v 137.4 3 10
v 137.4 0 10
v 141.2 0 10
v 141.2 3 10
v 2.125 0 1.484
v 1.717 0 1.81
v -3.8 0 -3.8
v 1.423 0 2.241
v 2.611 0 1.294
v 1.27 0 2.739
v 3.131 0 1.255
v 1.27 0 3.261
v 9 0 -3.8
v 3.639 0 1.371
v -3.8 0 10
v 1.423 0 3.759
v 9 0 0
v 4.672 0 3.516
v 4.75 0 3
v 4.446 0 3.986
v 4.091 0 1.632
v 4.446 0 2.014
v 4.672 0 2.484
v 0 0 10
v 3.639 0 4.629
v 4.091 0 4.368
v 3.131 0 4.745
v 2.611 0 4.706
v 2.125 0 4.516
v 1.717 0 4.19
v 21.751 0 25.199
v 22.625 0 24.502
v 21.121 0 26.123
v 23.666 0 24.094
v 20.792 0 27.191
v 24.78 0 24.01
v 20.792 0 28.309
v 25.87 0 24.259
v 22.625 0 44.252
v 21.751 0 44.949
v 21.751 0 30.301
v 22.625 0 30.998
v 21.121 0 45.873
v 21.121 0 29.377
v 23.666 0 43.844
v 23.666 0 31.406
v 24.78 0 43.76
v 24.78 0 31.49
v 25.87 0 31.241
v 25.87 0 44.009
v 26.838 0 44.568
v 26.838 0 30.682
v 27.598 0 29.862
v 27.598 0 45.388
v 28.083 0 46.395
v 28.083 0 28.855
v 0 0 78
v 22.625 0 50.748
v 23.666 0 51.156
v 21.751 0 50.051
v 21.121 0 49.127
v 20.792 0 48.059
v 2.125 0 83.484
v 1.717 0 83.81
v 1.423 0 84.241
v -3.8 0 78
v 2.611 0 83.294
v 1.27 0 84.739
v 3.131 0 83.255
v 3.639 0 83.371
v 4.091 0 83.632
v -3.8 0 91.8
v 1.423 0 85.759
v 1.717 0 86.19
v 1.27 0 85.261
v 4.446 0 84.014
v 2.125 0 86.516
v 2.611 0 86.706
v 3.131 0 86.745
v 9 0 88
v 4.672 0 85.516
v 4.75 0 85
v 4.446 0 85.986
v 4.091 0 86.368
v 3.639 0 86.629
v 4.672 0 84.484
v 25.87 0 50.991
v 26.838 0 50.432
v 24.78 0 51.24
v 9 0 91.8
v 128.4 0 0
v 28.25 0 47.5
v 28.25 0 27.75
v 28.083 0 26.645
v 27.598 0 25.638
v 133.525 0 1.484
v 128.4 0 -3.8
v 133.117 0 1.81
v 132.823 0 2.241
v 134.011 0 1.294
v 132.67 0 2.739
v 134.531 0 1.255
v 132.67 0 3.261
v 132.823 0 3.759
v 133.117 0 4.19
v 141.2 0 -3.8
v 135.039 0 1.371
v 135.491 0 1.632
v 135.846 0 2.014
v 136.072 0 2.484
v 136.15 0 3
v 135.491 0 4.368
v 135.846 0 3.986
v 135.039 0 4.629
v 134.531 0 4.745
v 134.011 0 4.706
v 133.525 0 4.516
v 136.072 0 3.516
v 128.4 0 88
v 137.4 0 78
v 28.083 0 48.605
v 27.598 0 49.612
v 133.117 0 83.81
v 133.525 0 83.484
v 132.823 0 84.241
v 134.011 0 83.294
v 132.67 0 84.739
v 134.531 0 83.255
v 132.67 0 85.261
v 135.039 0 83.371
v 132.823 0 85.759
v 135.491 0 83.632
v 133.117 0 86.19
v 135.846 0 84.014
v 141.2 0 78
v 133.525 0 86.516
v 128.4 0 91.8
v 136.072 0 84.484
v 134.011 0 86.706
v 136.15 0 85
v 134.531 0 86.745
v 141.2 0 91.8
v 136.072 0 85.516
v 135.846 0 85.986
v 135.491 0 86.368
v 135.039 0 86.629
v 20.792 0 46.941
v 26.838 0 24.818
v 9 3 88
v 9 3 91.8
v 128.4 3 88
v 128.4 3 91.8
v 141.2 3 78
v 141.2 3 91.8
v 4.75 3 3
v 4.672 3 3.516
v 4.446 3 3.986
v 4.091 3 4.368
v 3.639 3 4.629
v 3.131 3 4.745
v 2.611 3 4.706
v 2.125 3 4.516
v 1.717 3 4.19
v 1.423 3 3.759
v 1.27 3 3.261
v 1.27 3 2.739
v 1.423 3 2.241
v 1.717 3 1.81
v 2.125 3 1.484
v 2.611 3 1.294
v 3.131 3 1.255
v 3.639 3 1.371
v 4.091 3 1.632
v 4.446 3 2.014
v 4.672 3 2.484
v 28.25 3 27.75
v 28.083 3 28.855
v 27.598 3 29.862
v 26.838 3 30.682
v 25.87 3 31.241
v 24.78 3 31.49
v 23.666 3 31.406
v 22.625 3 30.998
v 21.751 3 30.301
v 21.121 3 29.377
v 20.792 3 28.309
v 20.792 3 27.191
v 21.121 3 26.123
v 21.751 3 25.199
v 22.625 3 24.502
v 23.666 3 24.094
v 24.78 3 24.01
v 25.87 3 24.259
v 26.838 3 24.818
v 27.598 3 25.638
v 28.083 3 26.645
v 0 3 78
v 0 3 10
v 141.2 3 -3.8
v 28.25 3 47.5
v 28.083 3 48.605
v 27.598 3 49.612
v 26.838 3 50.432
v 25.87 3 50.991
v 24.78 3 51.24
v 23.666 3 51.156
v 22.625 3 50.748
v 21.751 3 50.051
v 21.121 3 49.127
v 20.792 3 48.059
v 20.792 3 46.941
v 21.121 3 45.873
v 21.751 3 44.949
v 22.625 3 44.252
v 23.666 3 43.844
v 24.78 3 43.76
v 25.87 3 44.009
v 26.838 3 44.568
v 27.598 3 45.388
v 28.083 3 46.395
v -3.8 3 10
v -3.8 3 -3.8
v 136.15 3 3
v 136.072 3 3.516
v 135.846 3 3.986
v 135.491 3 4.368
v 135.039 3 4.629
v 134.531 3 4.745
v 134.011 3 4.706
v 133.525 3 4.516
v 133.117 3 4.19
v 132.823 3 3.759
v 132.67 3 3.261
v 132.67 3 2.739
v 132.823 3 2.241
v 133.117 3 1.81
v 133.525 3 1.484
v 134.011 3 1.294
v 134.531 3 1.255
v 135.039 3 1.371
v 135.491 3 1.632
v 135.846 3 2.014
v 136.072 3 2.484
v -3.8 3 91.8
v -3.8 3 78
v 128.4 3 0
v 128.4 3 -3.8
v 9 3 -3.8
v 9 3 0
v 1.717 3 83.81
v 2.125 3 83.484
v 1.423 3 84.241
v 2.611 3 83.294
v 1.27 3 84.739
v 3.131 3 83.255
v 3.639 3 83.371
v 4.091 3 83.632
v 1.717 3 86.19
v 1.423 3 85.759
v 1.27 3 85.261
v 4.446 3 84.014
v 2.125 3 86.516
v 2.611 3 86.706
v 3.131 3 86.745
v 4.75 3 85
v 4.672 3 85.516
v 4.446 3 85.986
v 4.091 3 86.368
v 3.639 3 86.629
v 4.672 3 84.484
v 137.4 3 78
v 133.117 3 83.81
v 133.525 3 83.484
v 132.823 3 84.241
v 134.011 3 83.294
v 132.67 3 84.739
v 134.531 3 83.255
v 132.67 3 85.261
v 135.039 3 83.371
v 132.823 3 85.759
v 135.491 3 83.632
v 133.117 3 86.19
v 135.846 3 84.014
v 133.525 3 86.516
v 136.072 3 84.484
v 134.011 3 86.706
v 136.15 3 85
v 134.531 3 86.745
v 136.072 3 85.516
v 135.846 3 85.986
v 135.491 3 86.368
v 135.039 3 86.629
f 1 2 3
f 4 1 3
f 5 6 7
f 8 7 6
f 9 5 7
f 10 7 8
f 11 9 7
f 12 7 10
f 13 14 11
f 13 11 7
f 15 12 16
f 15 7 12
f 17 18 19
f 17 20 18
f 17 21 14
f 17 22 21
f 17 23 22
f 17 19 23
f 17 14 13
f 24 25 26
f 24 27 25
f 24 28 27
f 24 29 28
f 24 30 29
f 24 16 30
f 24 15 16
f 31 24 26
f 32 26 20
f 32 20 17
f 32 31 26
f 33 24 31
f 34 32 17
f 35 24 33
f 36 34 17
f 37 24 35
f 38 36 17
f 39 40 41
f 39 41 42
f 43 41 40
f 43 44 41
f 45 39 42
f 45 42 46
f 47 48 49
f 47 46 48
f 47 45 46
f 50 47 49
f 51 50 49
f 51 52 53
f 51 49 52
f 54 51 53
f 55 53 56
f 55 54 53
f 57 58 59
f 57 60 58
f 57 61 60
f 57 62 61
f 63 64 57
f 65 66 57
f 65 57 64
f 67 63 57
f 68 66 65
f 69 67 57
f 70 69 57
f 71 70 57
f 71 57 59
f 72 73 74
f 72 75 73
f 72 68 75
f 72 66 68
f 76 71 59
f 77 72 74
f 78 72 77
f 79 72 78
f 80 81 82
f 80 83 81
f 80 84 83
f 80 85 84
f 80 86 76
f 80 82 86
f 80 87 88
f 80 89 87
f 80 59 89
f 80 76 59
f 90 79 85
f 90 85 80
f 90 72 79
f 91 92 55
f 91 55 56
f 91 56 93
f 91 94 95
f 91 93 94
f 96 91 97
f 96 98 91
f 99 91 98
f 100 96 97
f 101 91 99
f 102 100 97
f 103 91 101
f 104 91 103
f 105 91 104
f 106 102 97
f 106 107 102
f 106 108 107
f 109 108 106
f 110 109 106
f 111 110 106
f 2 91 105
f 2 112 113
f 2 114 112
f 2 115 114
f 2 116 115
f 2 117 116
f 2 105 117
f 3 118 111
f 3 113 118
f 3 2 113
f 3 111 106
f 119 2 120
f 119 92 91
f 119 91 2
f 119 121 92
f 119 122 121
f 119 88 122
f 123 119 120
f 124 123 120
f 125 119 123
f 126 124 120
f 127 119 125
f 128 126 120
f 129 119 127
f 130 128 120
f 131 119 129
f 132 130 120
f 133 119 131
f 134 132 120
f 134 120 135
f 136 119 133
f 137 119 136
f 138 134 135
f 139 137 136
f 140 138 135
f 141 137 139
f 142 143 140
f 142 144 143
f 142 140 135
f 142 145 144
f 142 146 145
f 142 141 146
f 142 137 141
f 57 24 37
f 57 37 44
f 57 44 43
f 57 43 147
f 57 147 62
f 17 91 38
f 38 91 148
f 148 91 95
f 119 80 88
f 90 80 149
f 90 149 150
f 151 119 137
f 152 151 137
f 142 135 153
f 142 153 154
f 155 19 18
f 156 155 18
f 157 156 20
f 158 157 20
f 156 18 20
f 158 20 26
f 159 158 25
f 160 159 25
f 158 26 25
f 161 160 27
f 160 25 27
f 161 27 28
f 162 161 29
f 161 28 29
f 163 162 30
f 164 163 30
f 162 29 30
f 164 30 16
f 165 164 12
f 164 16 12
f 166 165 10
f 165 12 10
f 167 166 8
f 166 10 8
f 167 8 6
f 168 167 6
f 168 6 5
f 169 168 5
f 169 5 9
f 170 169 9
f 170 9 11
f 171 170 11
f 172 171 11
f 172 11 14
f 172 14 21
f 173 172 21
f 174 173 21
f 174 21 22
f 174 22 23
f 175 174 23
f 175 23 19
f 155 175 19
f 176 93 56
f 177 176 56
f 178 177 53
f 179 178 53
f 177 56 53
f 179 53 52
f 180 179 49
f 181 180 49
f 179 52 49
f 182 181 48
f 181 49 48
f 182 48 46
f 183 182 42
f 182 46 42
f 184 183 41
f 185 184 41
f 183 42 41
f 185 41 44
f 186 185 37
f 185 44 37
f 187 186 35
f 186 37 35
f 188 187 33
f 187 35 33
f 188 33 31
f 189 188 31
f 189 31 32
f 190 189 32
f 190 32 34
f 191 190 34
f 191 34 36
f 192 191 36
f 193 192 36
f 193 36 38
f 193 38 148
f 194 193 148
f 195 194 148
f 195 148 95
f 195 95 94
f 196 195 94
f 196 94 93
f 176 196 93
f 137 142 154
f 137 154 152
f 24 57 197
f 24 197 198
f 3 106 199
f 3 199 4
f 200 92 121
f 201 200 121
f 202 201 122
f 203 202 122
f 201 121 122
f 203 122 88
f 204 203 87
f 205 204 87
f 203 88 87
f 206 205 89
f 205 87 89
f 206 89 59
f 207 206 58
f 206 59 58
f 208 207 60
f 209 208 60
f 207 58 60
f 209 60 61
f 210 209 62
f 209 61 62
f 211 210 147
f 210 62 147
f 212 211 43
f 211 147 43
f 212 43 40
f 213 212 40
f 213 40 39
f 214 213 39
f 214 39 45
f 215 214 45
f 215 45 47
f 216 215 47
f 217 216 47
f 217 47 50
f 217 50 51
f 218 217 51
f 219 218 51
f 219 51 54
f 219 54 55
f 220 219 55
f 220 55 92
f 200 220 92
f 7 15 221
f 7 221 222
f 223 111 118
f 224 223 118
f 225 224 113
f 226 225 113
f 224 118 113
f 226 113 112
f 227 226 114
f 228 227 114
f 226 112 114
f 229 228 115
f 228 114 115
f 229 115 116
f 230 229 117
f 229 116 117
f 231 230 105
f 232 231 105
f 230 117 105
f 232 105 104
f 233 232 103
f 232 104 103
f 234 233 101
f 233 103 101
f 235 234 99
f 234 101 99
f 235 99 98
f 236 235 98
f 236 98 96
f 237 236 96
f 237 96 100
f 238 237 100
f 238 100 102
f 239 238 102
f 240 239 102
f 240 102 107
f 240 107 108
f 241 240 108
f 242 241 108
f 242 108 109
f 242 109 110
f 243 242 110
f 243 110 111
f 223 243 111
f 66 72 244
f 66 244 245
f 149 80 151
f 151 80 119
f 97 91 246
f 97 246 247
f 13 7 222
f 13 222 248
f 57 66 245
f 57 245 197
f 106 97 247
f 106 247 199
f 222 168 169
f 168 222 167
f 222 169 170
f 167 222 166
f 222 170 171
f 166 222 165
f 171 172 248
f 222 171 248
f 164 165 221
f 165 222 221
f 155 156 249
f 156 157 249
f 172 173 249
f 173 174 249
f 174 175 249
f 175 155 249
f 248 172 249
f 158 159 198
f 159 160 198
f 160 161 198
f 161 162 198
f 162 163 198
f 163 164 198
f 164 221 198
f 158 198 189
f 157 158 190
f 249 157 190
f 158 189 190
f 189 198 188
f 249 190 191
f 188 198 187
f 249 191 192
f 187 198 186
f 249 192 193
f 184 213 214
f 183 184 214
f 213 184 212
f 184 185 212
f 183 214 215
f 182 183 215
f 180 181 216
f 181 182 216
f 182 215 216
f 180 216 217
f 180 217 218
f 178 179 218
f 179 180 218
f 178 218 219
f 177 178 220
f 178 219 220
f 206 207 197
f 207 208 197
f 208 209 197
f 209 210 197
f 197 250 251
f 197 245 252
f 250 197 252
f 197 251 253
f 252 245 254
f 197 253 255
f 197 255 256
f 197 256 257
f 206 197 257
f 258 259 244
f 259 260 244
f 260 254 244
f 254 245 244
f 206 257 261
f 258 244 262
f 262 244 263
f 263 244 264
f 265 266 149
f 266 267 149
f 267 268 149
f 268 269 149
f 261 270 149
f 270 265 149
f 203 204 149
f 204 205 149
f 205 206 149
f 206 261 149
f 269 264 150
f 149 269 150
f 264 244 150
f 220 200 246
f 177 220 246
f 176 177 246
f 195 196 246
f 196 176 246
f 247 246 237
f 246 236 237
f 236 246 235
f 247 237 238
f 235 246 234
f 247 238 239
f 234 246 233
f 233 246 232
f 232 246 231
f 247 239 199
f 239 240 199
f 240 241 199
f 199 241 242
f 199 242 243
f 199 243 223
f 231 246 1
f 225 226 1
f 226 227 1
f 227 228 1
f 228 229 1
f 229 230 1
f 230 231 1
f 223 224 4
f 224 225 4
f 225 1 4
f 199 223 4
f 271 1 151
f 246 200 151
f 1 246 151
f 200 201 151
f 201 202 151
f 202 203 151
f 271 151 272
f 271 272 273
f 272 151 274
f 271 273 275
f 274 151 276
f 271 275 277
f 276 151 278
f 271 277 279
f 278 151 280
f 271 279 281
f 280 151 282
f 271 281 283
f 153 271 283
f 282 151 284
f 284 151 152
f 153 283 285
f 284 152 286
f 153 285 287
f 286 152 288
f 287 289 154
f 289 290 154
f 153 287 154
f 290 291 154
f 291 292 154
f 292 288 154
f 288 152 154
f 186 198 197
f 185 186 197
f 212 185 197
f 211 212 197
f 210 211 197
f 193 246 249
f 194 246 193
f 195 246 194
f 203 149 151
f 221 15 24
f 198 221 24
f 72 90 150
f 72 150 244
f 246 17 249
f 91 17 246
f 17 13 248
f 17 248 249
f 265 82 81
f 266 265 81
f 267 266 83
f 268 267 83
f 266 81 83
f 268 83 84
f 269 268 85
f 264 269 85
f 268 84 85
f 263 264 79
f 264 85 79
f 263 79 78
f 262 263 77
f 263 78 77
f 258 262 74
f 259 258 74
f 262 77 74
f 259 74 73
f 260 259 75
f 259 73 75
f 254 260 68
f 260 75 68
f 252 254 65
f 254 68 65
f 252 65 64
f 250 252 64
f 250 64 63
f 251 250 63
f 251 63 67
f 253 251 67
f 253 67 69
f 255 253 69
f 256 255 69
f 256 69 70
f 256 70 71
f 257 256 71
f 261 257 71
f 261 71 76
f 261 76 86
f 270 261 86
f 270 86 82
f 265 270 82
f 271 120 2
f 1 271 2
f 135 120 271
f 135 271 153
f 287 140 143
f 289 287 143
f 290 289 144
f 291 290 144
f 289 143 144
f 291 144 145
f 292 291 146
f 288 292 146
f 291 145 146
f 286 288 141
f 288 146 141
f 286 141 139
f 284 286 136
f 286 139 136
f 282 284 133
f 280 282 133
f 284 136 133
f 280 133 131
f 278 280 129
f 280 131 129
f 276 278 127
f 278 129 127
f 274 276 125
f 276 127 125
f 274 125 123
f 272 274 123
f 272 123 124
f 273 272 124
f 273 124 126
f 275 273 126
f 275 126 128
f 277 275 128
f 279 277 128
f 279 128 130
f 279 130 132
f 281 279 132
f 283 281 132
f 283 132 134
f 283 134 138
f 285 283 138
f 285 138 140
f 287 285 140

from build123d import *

# Parameters (mm, degrees)
SKETCH1_W           = 137.4
SKETCH1_H           = 88
BOSS_EXTRUDE1_DEPTH = 3
SKETCH2_R           = 1.75
CUT_EXTRUDE1_DEPTH  = 4
SKETCH3_W           = 9
SKETCH3_H           = 3.8
SKETCH3_W_2         = 3.8
SKETCH3_H_2         = 10
BOSS_EXTRUDE2_DEPTH = 3
SKETCH4_R           = 3.75
CUT_EXTRUDE2_DEPTH  = 4


with BuildPart() as part:
    # Sketch1 → Boss-Extrude1 (new body)
    with BuildSketch(Plane(origin=(0, 0, 0), x_dir=(1, 0, 0), z_dir=(0, 1, 0))):
        with Locations((68.7, -44)):
            Rectangle(SKETCH1_W, SKETCH1_H)
    extrude(amount=BOSS_EXTRUDE1_DEPTH)

    # Sketch2 → Cut-Extrude1 (cut, through all)
    with BuildSketch(Plane.XZ):
        with Locations((3, 85)):
            Circle(SKETCH2_R)
        with Locations((134.4, 85)):
            Circle(SKETCH2_R)
        with Locations((134.4, 3)):
            Circle(SKETCH2_R)
        with Locations((3, 3)):
            Circle(SKETCH2_R)
    extrude(amount=-CUT_EXTRUDE1_DEPTH, mode=Mode.SUBTRACT)

    # Sketch3 → Boss-Extrude2 (add, through all)
    with BuildSketch(Plane.XZ):
        Polygon((0, 91.8), (-3.8, 91.8), (-3.8, 78), (0, 78), (0, 88), align=None)
        with Locations((4.5, 89.9)):
            Rectangle(SKETCH3_W, SKETCH3_H)
        with Locations((-1.9, 5)):
            Rectangle(SKETCH3_W_2, SKETCH3_H_2)
        Polygon((9, 0), (0, 0), (-3.8, 0), (-3.8, -3.8), (9, -3.8), align=None)
        Polygon((137.4, 0), (128.4, 0), (128.4, -3.8), (141.2, -3.8), (141.2, 0), align=None)
        with Locations((139.3, 5)):
            Rectangle(SKETCH3_W_2, SKETCH3_H_2)
        with Locations((132.9, 89.9)):
            Rectangle(SKETCH3_W, SKETCH3_H)
        Polygon((137.4, 91.8), (137.4, 88), (137.4, 78), (141.2, 78), (141.2, 91.8), align=None)
    extrude(amount=-BOSS_EXTRUDE2_DEPTH)

    # Sketch4 → Cut-Extrude2 (cut, through all)
    with BuildSketch(Plane.XZ):
        with Locations((24.5, 47.5)):
            Circle(SKETCH4_R)
        with Locations((24.5, 27.75)):
            Circle(SKETCH4_R)
    extrude(amount=-CUT_EXTRUDE2_DEPTH, mode=Mode.SUBTRACT)


solid = part.part
